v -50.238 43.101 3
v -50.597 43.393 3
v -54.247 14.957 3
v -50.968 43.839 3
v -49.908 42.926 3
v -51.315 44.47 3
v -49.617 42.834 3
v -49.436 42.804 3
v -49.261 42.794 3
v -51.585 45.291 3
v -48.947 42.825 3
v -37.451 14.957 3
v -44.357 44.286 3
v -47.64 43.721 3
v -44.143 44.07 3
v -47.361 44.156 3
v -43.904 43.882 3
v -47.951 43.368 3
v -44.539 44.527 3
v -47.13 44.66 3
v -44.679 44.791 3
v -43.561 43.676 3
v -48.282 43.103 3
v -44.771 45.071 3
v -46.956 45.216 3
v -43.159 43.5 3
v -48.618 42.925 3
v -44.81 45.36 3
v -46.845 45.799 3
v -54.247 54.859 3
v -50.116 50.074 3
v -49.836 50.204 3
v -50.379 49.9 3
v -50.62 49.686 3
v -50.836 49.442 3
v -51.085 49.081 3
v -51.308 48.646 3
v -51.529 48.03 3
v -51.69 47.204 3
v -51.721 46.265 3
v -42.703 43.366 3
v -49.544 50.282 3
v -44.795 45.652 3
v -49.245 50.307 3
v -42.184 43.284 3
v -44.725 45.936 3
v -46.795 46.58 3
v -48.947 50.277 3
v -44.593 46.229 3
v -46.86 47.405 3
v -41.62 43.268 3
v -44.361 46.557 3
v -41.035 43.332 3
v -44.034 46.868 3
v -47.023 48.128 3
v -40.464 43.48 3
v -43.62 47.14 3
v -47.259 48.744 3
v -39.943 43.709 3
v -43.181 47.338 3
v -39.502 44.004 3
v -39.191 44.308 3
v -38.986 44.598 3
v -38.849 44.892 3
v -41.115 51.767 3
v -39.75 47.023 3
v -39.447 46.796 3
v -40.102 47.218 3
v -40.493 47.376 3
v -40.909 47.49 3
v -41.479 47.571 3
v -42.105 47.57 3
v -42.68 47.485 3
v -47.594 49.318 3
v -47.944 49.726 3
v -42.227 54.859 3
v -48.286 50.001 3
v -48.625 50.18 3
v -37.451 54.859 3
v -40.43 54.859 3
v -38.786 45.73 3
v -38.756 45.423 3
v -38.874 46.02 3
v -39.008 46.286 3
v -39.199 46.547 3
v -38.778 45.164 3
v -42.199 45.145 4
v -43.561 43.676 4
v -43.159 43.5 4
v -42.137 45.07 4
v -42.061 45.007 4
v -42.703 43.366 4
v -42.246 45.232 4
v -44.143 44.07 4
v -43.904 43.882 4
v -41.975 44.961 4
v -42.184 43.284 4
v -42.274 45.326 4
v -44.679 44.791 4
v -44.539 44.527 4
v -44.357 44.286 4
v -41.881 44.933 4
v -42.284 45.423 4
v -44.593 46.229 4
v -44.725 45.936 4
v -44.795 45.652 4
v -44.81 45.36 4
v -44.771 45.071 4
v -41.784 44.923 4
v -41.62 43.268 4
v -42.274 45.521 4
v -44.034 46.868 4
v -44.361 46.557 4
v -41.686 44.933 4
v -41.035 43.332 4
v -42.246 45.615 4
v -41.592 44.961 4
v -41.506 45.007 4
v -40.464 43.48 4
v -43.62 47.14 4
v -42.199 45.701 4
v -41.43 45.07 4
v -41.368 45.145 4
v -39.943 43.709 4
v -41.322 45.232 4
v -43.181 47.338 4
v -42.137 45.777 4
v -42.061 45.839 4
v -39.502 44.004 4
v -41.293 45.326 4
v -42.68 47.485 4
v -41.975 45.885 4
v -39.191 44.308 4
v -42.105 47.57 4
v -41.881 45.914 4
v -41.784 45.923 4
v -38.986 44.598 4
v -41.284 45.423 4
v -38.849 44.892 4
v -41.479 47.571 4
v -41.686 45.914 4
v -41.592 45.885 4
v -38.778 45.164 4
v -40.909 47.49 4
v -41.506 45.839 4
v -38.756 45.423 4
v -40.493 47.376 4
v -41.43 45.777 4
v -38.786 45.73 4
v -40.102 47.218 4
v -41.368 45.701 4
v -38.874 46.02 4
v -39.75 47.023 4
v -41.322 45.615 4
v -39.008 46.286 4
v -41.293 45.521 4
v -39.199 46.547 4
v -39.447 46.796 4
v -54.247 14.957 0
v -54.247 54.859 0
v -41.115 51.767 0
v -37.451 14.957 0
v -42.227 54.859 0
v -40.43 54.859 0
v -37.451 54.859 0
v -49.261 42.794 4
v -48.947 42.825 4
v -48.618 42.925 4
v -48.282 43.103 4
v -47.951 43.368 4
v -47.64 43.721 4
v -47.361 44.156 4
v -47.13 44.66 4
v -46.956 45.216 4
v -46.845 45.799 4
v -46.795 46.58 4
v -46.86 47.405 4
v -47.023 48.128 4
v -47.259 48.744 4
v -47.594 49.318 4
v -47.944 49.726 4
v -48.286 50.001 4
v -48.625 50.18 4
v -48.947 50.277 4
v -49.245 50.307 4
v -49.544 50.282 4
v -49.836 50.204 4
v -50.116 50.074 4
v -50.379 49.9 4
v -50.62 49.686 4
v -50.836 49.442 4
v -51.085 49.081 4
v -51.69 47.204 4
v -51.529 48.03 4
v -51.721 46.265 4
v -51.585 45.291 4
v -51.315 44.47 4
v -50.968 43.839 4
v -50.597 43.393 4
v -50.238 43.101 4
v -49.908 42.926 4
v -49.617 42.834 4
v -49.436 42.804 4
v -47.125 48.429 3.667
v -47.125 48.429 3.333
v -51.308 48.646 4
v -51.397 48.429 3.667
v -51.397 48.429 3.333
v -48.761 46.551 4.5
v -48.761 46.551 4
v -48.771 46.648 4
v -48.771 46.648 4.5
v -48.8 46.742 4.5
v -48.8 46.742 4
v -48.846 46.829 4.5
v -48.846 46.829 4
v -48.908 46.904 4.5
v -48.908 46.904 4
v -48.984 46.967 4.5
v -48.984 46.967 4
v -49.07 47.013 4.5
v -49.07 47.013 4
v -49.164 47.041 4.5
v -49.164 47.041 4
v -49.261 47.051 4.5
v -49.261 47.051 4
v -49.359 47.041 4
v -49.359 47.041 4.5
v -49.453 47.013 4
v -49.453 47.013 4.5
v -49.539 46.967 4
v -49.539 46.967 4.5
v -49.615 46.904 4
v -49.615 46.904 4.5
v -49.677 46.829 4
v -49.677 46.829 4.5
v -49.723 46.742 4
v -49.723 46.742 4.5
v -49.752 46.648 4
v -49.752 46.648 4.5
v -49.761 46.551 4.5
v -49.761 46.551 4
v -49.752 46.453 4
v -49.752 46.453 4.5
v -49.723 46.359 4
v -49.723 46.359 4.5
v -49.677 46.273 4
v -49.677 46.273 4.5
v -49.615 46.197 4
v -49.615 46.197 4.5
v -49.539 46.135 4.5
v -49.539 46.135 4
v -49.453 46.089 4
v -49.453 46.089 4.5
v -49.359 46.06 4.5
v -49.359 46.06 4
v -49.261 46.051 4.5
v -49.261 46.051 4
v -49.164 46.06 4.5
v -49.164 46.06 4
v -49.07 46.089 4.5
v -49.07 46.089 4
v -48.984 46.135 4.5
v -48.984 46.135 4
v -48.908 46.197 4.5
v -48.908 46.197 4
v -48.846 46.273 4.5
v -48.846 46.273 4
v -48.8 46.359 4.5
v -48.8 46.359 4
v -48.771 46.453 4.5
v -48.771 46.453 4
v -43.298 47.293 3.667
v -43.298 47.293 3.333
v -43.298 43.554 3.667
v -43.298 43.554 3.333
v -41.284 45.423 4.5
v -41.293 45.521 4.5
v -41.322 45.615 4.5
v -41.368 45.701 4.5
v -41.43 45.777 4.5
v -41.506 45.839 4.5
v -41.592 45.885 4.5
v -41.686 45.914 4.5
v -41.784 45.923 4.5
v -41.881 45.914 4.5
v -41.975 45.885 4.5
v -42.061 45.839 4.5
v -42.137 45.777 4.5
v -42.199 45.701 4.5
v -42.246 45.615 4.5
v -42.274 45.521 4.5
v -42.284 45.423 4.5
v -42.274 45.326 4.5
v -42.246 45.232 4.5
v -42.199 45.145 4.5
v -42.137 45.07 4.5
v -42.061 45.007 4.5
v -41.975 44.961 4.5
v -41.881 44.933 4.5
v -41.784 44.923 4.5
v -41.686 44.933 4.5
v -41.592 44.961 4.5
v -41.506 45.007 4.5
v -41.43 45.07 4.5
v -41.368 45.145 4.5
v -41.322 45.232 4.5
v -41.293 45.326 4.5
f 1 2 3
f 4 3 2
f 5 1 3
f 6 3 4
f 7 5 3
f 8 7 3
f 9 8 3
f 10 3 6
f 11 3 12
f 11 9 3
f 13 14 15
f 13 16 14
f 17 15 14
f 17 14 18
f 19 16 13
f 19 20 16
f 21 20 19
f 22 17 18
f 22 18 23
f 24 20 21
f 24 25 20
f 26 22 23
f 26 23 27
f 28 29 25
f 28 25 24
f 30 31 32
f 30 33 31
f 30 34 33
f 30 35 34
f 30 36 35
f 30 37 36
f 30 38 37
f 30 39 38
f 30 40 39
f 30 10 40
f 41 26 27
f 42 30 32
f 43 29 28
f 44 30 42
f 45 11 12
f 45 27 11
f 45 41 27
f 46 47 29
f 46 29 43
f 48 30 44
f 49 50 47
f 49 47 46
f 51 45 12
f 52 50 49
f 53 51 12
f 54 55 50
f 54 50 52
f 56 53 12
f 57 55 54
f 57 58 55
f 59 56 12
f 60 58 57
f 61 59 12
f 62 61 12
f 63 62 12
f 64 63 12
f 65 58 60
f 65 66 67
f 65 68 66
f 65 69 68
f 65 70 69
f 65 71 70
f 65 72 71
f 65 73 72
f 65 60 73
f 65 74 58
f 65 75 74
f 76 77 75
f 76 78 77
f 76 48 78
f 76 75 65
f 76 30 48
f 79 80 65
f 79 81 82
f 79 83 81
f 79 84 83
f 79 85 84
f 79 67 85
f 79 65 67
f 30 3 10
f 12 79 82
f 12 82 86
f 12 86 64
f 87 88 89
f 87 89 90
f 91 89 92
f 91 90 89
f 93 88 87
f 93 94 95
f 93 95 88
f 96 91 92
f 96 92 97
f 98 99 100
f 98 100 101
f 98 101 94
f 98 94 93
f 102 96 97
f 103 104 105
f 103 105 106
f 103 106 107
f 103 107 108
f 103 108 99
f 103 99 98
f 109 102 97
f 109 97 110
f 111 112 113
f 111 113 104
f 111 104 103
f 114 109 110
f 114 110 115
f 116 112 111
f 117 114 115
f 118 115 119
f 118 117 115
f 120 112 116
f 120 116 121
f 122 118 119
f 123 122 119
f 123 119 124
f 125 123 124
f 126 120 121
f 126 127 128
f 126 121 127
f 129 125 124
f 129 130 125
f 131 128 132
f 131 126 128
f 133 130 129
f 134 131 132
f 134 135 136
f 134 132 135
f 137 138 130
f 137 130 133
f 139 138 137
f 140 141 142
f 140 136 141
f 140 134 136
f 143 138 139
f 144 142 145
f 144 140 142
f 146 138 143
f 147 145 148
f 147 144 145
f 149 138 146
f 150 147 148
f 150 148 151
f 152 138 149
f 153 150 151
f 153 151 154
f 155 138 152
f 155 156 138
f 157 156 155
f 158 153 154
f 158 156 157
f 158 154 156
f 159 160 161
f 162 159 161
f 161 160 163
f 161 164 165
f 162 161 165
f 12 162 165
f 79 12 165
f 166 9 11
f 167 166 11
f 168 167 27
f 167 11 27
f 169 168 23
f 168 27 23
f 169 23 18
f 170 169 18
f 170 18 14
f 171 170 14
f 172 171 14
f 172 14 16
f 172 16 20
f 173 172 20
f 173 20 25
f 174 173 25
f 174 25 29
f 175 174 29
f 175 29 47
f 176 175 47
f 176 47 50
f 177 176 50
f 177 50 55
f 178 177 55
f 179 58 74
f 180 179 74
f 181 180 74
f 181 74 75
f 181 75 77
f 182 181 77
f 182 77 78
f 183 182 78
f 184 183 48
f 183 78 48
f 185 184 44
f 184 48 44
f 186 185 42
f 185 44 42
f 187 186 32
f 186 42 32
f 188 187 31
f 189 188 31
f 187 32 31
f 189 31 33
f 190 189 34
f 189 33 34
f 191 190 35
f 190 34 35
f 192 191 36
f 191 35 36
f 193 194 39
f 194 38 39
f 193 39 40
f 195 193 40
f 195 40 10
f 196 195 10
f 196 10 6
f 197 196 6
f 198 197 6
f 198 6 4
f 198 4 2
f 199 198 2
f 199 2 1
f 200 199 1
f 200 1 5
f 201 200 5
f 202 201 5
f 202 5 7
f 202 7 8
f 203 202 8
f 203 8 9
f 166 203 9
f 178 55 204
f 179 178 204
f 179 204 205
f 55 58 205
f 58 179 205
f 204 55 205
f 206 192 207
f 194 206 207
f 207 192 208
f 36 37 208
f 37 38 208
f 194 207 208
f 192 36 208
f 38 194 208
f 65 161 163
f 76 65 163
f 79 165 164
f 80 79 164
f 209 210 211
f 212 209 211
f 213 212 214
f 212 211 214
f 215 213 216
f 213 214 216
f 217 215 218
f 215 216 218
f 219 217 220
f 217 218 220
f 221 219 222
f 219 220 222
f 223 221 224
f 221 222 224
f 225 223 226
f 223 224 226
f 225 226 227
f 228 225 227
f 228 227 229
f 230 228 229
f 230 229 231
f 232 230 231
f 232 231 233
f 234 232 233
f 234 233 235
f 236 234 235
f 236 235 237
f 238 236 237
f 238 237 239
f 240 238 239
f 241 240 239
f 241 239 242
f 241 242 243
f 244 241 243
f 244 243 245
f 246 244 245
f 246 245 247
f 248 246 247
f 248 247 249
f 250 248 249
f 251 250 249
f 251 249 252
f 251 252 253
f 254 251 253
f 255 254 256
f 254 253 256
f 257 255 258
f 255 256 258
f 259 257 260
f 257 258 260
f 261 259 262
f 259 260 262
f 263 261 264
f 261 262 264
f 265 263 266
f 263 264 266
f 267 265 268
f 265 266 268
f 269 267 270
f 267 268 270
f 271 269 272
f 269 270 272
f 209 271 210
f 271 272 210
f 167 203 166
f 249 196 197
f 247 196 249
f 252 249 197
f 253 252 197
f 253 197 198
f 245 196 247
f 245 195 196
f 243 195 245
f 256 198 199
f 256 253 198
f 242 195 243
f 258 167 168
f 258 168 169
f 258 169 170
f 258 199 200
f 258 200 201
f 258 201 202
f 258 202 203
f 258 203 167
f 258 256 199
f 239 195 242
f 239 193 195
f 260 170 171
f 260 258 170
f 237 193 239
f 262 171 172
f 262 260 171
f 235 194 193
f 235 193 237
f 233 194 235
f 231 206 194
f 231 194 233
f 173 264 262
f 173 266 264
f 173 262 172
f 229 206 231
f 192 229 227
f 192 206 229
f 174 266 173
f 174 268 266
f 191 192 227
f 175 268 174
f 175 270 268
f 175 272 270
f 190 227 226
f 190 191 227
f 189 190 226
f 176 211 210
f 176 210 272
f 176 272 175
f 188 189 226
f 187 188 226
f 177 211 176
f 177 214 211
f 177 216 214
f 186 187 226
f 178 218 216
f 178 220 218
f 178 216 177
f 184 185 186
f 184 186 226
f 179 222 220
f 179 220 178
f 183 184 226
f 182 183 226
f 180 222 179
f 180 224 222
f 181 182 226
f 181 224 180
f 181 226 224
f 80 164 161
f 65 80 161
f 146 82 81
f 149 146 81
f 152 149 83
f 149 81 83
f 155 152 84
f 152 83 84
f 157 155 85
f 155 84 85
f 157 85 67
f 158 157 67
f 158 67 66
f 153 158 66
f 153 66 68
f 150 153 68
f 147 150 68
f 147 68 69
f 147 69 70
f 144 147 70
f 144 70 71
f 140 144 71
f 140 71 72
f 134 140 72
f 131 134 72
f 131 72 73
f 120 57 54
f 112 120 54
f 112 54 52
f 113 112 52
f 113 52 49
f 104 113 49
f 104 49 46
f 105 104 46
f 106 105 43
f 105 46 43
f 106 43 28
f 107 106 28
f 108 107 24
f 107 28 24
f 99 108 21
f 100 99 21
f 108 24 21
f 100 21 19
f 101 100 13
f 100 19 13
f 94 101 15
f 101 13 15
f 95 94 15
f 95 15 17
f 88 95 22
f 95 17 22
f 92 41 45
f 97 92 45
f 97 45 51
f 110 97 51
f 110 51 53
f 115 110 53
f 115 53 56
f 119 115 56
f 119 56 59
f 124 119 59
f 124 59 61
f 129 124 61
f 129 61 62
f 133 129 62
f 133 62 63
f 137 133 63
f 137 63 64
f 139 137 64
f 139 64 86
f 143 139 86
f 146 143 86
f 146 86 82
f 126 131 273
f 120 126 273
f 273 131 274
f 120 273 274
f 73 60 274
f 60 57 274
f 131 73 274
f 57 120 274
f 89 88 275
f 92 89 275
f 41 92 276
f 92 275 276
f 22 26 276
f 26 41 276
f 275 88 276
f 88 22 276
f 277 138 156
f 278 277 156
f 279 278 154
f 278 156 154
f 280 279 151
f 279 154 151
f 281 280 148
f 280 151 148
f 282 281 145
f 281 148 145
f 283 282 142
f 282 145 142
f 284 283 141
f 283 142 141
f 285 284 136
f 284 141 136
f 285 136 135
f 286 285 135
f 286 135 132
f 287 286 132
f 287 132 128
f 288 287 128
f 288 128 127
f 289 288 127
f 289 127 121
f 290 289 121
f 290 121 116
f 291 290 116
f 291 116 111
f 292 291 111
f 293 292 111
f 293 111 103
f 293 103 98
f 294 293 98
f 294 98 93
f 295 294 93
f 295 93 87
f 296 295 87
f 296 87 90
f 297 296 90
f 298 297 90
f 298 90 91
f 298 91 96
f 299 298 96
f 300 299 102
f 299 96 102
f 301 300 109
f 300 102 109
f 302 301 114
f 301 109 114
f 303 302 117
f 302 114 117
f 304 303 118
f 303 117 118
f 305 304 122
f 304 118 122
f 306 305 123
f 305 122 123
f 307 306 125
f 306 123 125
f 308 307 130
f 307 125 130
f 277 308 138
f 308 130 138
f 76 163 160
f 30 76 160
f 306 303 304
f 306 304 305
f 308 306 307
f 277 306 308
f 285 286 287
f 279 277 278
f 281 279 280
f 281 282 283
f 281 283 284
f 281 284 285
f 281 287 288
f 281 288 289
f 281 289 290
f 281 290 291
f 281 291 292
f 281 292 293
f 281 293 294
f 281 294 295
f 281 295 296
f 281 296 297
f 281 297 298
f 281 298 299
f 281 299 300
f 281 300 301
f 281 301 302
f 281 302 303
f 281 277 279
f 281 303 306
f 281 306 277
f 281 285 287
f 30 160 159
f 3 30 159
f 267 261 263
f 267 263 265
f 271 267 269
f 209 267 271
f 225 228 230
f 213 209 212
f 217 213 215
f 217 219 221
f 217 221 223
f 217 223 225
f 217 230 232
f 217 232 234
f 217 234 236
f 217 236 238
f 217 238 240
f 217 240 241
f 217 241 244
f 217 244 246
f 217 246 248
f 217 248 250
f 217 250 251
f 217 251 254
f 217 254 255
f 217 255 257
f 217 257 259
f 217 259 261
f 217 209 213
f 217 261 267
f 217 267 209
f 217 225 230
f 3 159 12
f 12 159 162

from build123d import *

# Parameters (mm, degrees)
F1_DEPTH = 3
F0_R     = 0.5
F2_DEPTH = 4
F3_DEPTH = 4.5


with BuildPart() as f1:
    # F0 (on Top) → F1 (new body)
    with BuildSketch(Plane.XY):
        Polygon((-42.22717, 54.8594), (-54.246616, 54.8594), (-54.246616, 14.957247), (-37.451323, 14.957247), (-37.451323, 54.8594), (-40.430126, 54.8594), (-41.114714, 51.767185), align=None)
        with BuildLine():
            add(Edge.make_bspline(
                [(-49.261443, 42.794443), (-44.9895, 42.794443), (-47.125472, 48.428944), (-49.261443, 54.063445), (-51.397415, 48.428944), (-53.533386, 42.794443), (-49.261443, 42.794443)],
                knots=[0, 0, 0, 2.094395, 2.094395, 4.18879, 4.18879, 6.283185, 6.283185, 6.283185], degree=2, weights=[1, 0.5, 1, 0.5, 1, 0.5, 1]))
        make_face(mode=Mode.SUBTRACT)
        with BuildLine():
            add(Edge.make_bspline(
                [(-38.755624, 45.423176), (-38.755624, 49.162015), (-43.297707, 47.292595), (-47.83979, 45.423176), (-43.297707, 43.553757), (-38.755624, 41.684338), (-38.755624, 45.423176)],
                knots=[0, 0, 0, 2.094395, 2.094395, 4.18879, 4.18879, 6.283185, 6.283185, 6.283185], degree=2, weights=[1, 0.5, 1, 0.5, 1, 0.5, 1]))
        make_face(mode=Mode.SUBTRACT)
    extrude(amount=F1_DEPTH)

    # F0 (on Top) → F2 (join)
    with BuildSketch(Plane.XY):
        with BuildLine():
            add(Edge.make_bspline(
                [(-49.261443, 42.794443), (-44.9895, 42.794443), (-47.125472, 48.428944), (-49.261443, 54.063445), (-51.397415, 48.428944), (-53.533386, 42.794443), (-49.261443, 42.794443)],
                knots=[0, 0, 0, 2.094395, 2.094395, 4.18879, 4.18879, 6.283185, 6.283185, 6.283185], degree=2, weights=[1, 0.5, 1, 0.5, 1, 0.5, 1]))
        make_face()
        with Locations((-49.261443, 46.550777)):
            Circle(F0_R, mode=Mode.SUBTRACT)
        with BuildLine():
            add(Edge.make_bspline(
                [(-38.755624, 45.423176), (-38.755624, 49.162015), (-43.297707, 47.292595), (-47.83979, 45.423176), (-43.297707, 43.553757), (-38.755624, 41.684338), (-38.755624, 45.423176)],
                knots=[0, 0, 0, 2.094395, 2.094395, 4.18879, 4.18879, 6.283185, 6.283185, 6.283185], degree=2, weights=[1, 0.5, 1, 0.5, 1, 0.5, 1]))
        make_face()
        with Locations((-41.783679, 45.423176)):
            Circle(F0_R, mode=Mode.SUBTRACT)
    extrude(amount=F2_DEPTH)

    # F0 (on Top) → F3 (join)
    with BuildSketch(Plane.XY):
        with Locations((-49.261443, 46.550777)):
            Circle(F0_R)
        with Locations((-41.783679, 45.423176)):
            Circle(F0_R)
    extrude(amount=F3_DEPTH)


solid = f1.part
